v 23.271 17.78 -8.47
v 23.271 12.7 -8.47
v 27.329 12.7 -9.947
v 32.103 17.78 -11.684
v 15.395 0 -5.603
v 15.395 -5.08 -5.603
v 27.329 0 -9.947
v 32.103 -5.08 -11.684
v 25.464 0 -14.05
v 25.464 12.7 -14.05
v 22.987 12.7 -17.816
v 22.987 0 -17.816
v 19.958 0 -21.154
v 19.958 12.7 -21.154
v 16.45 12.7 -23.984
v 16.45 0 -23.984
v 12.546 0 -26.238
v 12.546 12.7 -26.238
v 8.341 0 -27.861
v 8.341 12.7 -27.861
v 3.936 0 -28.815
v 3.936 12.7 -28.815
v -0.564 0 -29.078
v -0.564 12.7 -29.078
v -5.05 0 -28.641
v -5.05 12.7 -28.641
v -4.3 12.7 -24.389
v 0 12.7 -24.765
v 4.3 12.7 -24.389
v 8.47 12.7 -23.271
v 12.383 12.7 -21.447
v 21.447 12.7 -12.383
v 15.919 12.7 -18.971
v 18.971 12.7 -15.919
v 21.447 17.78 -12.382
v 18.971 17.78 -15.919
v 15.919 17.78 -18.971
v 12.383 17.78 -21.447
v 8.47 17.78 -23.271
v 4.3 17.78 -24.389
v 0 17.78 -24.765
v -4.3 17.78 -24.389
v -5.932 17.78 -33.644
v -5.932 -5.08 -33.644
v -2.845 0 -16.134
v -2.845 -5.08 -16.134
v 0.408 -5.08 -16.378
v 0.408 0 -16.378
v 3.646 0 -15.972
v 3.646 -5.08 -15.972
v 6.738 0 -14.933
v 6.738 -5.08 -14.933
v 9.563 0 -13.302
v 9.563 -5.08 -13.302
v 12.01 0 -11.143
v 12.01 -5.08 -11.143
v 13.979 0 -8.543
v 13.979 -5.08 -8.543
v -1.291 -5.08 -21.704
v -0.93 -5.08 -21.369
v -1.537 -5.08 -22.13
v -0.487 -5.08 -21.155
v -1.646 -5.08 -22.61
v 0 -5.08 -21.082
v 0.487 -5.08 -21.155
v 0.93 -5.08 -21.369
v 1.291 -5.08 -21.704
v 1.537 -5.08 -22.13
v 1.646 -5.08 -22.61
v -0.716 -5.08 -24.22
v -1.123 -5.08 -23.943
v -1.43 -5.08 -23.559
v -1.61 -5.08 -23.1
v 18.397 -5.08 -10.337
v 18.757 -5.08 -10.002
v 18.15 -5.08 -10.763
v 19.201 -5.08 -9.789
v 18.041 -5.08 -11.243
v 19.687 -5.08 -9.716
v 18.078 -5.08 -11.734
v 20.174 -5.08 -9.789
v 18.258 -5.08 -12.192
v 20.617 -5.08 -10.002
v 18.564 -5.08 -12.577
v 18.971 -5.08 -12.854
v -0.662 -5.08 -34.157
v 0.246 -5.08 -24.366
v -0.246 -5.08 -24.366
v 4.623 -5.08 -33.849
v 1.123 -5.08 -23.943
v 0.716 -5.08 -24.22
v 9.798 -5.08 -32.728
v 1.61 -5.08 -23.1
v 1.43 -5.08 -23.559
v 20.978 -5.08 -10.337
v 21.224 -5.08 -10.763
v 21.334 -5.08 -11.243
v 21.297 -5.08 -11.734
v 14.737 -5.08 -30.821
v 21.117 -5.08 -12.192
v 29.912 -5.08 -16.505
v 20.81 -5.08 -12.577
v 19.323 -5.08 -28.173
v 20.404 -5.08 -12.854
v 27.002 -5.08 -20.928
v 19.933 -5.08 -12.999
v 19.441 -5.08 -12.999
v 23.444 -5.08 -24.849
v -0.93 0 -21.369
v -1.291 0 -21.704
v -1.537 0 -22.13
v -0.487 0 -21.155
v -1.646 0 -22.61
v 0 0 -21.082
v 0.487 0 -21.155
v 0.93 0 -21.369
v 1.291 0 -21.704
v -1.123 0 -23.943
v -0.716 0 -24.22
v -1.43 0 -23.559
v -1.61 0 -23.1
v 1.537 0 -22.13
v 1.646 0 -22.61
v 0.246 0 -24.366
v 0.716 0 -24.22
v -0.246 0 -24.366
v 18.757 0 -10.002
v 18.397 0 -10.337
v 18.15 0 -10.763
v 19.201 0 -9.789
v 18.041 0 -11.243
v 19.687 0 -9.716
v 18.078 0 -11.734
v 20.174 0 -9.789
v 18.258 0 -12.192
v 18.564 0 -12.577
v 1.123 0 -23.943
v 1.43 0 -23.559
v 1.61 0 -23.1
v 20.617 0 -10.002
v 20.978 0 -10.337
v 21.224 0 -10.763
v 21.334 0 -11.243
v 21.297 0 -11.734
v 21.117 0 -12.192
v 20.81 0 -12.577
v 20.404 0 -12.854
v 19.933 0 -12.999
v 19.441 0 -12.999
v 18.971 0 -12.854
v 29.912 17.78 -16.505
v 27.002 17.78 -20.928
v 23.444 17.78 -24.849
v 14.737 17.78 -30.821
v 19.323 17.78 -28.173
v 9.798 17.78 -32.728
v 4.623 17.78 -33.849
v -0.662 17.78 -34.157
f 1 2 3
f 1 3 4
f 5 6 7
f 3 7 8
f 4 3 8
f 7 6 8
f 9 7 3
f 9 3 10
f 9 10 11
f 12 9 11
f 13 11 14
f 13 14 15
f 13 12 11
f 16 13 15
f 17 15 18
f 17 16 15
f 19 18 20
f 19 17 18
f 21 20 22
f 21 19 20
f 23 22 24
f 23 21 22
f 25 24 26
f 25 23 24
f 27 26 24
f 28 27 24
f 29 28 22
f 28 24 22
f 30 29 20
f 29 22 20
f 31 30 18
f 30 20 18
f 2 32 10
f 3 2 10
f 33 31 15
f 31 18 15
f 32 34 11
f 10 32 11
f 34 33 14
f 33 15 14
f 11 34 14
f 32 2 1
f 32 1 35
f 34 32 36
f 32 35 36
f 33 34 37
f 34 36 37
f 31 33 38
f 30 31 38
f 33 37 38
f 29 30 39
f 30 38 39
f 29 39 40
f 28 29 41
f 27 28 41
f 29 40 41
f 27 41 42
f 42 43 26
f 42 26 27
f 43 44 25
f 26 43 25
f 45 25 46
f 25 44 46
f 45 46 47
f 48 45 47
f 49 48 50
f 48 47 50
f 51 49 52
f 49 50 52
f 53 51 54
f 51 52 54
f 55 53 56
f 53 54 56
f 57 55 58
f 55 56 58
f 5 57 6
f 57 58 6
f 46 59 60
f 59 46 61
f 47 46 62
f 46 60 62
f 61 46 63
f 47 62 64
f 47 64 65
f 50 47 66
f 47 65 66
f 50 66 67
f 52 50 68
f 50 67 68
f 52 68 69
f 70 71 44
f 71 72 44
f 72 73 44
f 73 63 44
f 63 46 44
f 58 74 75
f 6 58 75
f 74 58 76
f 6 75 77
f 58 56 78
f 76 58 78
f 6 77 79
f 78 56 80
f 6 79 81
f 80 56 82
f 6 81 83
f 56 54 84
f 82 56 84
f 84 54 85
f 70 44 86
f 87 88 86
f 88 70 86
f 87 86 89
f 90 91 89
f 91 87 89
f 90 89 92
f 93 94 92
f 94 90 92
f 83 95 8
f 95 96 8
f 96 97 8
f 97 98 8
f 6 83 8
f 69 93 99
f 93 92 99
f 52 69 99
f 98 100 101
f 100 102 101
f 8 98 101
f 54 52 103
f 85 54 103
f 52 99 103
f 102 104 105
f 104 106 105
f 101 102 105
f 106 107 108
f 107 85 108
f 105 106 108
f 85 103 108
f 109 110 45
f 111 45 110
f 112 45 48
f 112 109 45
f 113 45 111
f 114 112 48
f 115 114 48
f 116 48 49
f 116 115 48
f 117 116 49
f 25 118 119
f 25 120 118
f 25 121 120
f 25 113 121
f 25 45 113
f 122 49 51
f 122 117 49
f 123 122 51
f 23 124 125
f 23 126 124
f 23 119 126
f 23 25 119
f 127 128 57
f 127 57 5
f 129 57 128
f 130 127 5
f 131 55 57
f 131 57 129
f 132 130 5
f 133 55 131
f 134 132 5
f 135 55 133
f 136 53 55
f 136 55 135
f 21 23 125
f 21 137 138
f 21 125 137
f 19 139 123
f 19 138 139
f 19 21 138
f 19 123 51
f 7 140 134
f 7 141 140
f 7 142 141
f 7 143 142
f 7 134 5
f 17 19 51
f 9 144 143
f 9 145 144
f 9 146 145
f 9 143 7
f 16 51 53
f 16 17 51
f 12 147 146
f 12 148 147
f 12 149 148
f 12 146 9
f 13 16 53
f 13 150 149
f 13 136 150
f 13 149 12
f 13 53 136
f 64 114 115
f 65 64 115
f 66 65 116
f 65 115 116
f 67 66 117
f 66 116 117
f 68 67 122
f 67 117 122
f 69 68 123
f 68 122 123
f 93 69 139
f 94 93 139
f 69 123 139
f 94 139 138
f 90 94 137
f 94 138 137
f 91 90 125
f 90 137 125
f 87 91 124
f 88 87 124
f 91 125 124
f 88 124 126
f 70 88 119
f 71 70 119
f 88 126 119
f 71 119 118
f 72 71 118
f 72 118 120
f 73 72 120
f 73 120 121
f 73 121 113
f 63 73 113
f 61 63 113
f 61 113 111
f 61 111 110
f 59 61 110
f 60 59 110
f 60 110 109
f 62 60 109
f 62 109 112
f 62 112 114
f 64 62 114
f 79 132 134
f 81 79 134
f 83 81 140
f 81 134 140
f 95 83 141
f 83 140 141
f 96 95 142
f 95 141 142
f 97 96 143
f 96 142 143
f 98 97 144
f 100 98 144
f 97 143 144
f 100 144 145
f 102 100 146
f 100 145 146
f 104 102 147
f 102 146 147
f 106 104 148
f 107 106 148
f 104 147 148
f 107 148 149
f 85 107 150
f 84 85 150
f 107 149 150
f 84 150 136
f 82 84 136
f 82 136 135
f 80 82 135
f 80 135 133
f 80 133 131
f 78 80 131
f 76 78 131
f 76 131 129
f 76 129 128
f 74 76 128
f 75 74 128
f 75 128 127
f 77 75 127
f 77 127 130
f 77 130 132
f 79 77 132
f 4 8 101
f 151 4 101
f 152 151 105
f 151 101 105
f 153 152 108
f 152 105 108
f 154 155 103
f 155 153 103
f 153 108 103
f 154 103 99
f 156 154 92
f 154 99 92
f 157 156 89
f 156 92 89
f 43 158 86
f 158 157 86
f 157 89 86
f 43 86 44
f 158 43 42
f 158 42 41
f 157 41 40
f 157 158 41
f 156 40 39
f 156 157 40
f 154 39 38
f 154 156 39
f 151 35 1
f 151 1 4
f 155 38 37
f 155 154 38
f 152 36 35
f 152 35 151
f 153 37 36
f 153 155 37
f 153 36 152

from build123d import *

# Parameters (mm, degrees)
BOSS_EXTRUDE1_DEPTH = 12.7
SHELL1_T            = 5.08
SKETCH1_3_R         = 1.651
SKETCH1_3_R_2       = 1.6509999999999996
CUT_EXTRUDE1_DEPTH  = 12.192
SKETCH2_R           = 24.765
CUT_EXTRUDE2_DEPTH  = 5.08


with BuildPart() as part:
    # Sketch1 → Boss-Extrude1 (new body)
    with BuildSketch(Plane(origin=(0, 0, 0), x_dir=(1, 0, 0), z_dir=(0, 1, 0))):
        with BuildLine():
            ThreePointArc((25.18661681826276, 14.541500000000127), (14.541499999999942, 25.186616818262866), (1.78e-15, 29.083000000000002))
            Line((0, 29.083000000000002), (0, 24.384))
            ThreePointArc((-2.409e-14, 24.384), (1.1674332957389815, 23.900433295739), (1.651, 22.733))
            ThreePointArc((1.651, 22.733), (1.1674332957389804, 21.565566704261002), (-2.523e-14, 21.082))
            Line((0, 21.082), (0, 16.383))
            ThreePointArc((1e-15, 16.383000000000003), (8.191499999999966, 14.188094190200482), (14.188094190200419, 8.191500000000074))
            Line((14.188094190200417, 8.191500000000072), (18.257547562583486, 10.541000000000096))
            ThreePointArc((18.257547562583472, 10.541000000000121), (18.86185550423157, 12.796307941648193), (21.11716344587966, 12.192000000000167))
            Line((21.117163445879694, 12.19200000000011), (25.18661681826275, 14.541500000000124))
        make_face()
        with BuildLine():
            ThreePointArc((1.651, 22.733), (1.1674332957389815, 23.900433295739), (-2.409e-14, 24.384))
            Line((0, 24.384), (0, 21.082))
            ThreePointArc((-2.523e-14, 21.082), (1.1674332957389804, 21.565566704261002), (1.651, 22.733))
        make_face()
        with BuildLine():
            Line((0, 21.082), (0, 24.384))
            ThreePointArc((-2.409e-14, 24.384), (-1.651, 22.733), (-2.523e-14, 21.082))
        make_face()
        with BuildLine():
            Line((0, 24.384), (0, 29.083000000000002))
            ThreePointArc((1.78e-15, 29.083000000000002), (-2.5347504663301574, 28.972330404602236), (-5.050209951087366, 28.641163880854045))
            Line((-5.050209951087367, 28.641163880854048), (-2.8448780947173375, 16.134105417599))
            ThreePointArc((-2.8448780947173375, 16.134105417599006), (-1.4278725334348923, 16.320657738837067), (1e-15, 16.383000000000003))
            Line((0, 16.383), (0, 21.082))
            ThreePointArc((-2.523e-14, 21.082), (-1.651, 22.733), (-2.409e-14, 24.384))
        make_face()
        with BuildLine():
            ThreePointArc((21.338355504231593, 11.366500000000098), (21.282099043434833, 11.793810243464398), (21.11716344587966, 12.192000000000167))
            Line((21.117163445879694, 12.19200000000011), (18.257547562583486, 10.541000000000096))
            ThreePointArc((18.257547562583472, 10.541000000000121), (20.11466574769584, 9.771756460796842), (21.338355504231593, 11.366500000000098))
        make_face()
        with BuildLine():
            Line((18.257547562583486, 10.541000000000096), (21.117163445879694, 12.19200000000011))
            ThreePointArc((21.11716344587966, 12.192000000000167), (18.86185550423157, 12.796307941648193), (18.257547562583472, 10.541000000000121))
        make_face()
        with BuildLine():
            ThreePointArc((27.32908049031651, 9.9469718283406), (26.358149370386823, 12.291006906204913), (25.18661681826276, 14.541500000000127))
            Line((25.18661681826275, 14.541500000000124), (21.117163445879694, 12.19200000000011))
            ThreePointArc((21.11716344587966, 12.192000000000167), (21.282099043434833, 11.793810243464398), (21.338355504231593, 11.366500000000098))
            ThreePointArc((21.338355504231593, 11.366500000000098), (20.11466574769584, 9.771756460796842), (18.257547562583472, 10.541000000000121))
            Line((18.257547562583486, 10.541000000000096), (14.188094190200417, 8.191500000000072))
            ThreePointArc((14.188094190200419, 8.191500000000074), (14.848040475021392, 6.923754982097979), (15.394984206335495, 5.603316008104555))
            Line((15.394984206335494, 5.603316008104554), (27.329080490316503, 9.946971828340597))
        make_face()
    extrude(amount=BOSS_EXTRUDE1_DEPTH)

    # Shell1
    shell1_openings = [part.faces().sort_by_distance(p)[0] for p in [
        (21.362032348, 6.35, -7.775143918),
        (8.1915, 6.35, -14.18809419),
        (-3.947544023, 6.35, -22.387634649),
    ]]
    offset(amount=SHELL1_T, openings=shell1_openings, kind=Kind.INTERSECTION)

    # Sketch1<3> → Cut-Extrude1 (cut)
    with BuildSketch(Plane(origin=(0, 0, 0), x_dir=(1, 0, 0), z_dir=(0, 1, 0))):
        with Locations(Location((0, 22.733, 0), (0, 0, 270))):
            Circle(SKETCH1_3_R)
        with Locations(Location((19.687355504231594, 11.366500000000098, 0), (0, 0, 270))):
            Circle(SKETCH1_3_R_2)
    extrude(amount=-CUT_EXTRUDE1_DEPTH, mode=Mode.SUBTRACT)

    # Sketch2 → Cut-Extrude2 (cut)
    with BuildSketch(Plane(origin=(0, 17.78, 0), x_dir=(1, 0, 0), z_dir=(0, 1, 0))):
        Circle(SKETCH2_R)
    extrude(amount=-CUT_EXTRUDE2_DEPTH, mode=Mode.SUBTRACT)


solid = part.part
